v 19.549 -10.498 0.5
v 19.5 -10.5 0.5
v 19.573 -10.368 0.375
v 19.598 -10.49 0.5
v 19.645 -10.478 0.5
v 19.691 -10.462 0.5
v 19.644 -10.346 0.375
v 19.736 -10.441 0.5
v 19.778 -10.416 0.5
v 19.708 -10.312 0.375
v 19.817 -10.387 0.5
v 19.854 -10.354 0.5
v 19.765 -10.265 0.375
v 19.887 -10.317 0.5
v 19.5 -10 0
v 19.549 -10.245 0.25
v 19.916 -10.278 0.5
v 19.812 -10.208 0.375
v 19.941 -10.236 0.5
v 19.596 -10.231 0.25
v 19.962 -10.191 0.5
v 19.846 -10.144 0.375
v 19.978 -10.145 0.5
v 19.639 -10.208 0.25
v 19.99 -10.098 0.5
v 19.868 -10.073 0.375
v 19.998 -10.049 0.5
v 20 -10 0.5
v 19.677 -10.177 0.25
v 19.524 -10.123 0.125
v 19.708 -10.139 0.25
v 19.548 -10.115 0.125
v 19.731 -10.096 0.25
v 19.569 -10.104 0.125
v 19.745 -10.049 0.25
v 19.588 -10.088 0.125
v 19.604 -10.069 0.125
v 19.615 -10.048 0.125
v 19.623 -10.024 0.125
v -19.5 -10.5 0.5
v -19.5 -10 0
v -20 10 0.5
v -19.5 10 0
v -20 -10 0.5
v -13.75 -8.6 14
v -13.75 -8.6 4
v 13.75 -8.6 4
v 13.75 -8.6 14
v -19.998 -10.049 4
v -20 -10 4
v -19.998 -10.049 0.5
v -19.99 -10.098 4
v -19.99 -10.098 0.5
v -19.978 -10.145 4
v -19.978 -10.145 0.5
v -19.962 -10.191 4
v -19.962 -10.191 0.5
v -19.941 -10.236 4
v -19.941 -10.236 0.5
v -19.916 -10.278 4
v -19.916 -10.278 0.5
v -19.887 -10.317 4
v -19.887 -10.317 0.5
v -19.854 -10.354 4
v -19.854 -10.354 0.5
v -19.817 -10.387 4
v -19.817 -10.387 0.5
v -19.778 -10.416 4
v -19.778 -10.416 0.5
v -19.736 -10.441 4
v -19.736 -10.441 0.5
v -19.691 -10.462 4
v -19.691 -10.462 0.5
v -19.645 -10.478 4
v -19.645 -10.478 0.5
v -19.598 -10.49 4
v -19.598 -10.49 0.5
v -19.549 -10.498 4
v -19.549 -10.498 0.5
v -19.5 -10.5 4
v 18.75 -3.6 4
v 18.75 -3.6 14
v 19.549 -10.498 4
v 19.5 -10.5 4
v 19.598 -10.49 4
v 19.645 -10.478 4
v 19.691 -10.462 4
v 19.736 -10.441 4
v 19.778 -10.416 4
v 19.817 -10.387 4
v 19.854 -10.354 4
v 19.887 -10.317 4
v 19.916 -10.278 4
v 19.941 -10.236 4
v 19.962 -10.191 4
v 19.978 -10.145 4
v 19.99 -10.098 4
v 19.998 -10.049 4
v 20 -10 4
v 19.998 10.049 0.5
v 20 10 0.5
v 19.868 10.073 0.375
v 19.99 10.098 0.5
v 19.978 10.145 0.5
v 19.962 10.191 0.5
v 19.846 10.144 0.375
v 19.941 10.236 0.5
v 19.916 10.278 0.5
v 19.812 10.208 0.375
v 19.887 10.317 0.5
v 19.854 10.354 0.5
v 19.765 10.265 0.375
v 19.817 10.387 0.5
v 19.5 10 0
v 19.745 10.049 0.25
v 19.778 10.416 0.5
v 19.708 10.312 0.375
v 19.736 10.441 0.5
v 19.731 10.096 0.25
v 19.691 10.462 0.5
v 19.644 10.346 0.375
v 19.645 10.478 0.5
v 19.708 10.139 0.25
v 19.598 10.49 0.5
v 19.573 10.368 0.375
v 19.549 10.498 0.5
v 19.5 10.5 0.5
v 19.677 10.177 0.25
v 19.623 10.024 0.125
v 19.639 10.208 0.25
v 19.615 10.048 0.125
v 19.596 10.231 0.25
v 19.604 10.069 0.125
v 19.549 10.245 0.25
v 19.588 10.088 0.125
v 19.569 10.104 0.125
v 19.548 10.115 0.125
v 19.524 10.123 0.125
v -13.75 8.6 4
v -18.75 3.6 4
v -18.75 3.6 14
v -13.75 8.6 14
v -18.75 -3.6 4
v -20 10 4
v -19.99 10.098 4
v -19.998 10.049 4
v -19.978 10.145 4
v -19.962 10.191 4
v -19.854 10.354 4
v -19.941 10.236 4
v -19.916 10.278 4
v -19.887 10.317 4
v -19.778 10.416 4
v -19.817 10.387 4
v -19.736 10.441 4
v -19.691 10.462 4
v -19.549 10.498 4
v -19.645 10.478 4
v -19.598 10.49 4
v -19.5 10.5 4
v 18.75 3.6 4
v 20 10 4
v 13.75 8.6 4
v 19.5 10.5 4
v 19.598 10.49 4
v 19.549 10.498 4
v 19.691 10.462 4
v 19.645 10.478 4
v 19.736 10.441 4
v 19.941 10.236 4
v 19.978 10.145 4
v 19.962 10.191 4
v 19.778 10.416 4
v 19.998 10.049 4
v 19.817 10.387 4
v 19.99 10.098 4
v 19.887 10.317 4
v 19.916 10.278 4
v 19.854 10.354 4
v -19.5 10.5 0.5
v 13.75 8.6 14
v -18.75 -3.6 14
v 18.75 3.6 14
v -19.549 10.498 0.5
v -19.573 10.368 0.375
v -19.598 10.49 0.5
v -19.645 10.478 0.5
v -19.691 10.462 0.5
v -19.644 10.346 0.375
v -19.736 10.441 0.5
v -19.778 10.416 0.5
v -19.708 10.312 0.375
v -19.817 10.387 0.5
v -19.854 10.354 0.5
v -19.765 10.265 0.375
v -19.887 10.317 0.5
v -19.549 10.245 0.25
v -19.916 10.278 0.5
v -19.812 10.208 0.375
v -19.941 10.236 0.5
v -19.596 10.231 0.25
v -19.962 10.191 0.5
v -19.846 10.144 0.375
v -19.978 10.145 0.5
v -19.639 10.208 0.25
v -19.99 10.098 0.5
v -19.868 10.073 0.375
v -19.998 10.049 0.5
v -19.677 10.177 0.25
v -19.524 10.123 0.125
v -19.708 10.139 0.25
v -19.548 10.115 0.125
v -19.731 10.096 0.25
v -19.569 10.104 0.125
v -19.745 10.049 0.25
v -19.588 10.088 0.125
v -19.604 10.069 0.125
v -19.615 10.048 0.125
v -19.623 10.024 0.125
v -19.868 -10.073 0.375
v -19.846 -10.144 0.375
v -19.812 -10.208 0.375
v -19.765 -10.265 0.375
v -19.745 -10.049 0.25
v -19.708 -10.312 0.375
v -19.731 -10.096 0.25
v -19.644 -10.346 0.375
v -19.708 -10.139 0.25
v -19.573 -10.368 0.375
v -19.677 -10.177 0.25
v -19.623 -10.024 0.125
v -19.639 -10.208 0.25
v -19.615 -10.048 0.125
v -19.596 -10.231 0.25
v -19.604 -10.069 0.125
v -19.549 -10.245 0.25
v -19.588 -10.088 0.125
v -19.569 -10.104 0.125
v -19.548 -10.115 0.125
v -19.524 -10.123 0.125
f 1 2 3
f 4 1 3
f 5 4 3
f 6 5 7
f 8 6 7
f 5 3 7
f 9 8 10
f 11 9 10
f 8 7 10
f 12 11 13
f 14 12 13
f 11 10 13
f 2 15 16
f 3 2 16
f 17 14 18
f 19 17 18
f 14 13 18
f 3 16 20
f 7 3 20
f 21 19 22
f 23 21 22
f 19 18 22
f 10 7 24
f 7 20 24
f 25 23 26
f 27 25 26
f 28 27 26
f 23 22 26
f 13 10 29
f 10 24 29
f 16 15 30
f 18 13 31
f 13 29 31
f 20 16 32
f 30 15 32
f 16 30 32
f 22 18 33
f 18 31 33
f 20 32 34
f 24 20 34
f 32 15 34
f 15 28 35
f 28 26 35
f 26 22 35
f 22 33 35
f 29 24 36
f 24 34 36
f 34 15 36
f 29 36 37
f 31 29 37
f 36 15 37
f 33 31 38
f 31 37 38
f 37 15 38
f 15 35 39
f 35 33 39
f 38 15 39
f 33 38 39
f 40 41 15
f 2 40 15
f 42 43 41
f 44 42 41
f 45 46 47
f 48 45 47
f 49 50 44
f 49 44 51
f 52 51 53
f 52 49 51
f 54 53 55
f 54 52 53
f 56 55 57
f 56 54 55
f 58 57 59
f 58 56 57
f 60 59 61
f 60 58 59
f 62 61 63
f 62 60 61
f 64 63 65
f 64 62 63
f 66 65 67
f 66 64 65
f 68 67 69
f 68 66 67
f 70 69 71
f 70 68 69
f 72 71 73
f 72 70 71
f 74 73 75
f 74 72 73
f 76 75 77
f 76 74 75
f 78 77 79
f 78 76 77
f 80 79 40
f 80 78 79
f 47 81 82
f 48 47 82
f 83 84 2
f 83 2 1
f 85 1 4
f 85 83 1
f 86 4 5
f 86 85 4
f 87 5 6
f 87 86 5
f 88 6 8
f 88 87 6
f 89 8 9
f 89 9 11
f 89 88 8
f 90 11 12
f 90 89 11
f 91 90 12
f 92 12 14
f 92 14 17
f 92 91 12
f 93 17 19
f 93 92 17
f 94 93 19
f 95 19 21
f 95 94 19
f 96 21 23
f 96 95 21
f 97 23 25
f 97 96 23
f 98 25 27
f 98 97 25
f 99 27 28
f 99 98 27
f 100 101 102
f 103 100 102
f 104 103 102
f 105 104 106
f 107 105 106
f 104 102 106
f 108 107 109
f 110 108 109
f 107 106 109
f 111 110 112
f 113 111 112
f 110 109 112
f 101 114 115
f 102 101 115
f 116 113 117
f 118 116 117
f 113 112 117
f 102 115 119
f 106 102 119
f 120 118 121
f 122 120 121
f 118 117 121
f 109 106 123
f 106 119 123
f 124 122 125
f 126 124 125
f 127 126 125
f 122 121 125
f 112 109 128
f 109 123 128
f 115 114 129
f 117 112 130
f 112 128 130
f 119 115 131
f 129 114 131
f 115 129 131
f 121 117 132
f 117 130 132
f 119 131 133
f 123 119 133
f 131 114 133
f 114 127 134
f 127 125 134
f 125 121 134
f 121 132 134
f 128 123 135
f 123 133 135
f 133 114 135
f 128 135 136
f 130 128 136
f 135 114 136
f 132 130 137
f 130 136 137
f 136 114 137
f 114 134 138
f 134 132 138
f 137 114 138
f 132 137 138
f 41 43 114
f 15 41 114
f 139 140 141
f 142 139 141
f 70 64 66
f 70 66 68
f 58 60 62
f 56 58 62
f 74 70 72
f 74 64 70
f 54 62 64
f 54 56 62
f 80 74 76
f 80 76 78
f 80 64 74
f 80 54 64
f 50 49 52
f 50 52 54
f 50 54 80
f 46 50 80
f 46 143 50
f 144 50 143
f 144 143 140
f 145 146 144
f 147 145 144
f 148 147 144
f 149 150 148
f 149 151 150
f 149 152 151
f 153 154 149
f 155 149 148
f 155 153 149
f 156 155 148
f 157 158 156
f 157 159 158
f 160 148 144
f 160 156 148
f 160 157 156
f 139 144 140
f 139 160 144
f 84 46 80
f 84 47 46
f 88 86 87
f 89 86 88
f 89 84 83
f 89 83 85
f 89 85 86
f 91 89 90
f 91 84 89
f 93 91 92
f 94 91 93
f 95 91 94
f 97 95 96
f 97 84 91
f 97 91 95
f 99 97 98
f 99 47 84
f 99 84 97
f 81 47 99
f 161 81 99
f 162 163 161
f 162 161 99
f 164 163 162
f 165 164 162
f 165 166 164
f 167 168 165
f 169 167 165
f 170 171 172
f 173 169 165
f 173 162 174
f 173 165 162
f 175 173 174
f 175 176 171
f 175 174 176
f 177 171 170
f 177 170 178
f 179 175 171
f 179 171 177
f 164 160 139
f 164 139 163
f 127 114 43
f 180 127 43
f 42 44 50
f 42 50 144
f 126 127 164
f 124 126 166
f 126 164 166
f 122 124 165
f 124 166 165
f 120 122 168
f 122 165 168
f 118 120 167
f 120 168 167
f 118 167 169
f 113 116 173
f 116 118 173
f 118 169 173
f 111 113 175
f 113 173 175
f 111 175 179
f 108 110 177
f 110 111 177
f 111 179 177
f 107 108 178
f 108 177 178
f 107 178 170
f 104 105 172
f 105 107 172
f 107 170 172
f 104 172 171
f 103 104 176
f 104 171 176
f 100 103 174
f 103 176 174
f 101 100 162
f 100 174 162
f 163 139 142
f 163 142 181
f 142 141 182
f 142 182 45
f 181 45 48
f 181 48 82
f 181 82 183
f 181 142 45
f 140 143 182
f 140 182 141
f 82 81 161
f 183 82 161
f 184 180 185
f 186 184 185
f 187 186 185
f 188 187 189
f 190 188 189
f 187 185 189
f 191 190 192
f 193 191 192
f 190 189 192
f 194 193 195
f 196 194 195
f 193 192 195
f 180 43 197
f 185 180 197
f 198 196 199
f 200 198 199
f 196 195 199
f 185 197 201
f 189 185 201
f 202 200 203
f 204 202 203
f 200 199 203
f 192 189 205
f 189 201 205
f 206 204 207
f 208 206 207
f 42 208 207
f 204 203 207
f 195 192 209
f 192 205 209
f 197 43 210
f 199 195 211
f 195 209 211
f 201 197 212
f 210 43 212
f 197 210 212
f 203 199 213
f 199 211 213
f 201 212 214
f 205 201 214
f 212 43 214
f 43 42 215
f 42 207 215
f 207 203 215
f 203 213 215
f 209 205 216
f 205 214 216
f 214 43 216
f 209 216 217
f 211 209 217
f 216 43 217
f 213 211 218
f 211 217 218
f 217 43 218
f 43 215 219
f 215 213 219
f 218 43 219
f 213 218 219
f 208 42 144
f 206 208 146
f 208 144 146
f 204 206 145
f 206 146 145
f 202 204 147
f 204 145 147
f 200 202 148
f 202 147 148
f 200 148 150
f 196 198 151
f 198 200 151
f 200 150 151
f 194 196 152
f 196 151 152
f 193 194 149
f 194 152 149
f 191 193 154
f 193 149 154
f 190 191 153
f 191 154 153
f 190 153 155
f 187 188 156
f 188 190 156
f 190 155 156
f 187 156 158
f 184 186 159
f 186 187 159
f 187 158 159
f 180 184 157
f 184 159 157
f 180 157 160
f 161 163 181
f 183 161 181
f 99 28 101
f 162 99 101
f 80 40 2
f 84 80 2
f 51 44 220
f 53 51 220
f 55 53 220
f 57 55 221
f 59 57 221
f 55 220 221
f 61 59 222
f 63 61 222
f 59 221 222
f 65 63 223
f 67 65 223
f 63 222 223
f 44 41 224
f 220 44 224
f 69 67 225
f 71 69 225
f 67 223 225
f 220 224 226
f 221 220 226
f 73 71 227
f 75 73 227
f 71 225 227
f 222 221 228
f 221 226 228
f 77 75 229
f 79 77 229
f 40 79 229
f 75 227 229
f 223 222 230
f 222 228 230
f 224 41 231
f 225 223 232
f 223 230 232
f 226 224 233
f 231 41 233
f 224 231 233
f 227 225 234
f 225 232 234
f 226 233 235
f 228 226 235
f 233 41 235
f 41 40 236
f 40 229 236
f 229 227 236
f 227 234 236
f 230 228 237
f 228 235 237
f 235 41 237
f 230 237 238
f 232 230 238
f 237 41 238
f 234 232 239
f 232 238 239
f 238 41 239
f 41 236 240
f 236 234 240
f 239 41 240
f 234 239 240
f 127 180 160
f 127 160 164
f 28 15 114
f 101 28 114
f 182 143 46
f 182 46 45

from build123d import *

# Parameters (mm, degrees)
F0_W     = 40
F0_H     = 21
F1_DEPTH = 4
F2_W     = 37.5
F2_H     = 17.2
F3_DEPTH = 10
F4_SIZE  = 5
F5_R     = 0.5
F6_SIZE  = 0.5


with BuildPart() as f1:
    # F0 (on Top) → F1 (new body)
    with BuildSketch(Plane.XY):
        Rectangle(F0_W, F0_H)
    extrude(amount=F1_DEPTH)

    # F2 (on face) → F3 (join)
    with BuildSketch(Plane.XY.offset(4)):
        Rectangle(F2_W, F2_H)
    extrude(amount=F3_DEPTH)

    # F4
    f4_edges = [f1.edges().sort_by_distance(p)[0] for p in [
        (18.75, -8.6, 9),
        (-18.75, -8.6, 9),
        (18.75, 8.6, 9),
        (-18.75, 8.6, 9),
    ]]
    chamfer(f4_edges, length=F4_SIZE)

    # F5
    f5_edges = [f1.edges().sort_by_distance(p)[0] for p in [
        (-20, -10.5, 2),
        (-20, 10.5, 2),
        (20, -10.5, 2),
        (20, 10.5, 2),
    ]]
    fillet(f5_edges, radius=F5_R)

    # F6
    f6_edges = [f1.edges().sort_by_distance(p)[0] for p in [
        (20, 0, 0),
    ]]
    chamfer(f6_edges, length=F6_SIZE)


solid = f1.part
